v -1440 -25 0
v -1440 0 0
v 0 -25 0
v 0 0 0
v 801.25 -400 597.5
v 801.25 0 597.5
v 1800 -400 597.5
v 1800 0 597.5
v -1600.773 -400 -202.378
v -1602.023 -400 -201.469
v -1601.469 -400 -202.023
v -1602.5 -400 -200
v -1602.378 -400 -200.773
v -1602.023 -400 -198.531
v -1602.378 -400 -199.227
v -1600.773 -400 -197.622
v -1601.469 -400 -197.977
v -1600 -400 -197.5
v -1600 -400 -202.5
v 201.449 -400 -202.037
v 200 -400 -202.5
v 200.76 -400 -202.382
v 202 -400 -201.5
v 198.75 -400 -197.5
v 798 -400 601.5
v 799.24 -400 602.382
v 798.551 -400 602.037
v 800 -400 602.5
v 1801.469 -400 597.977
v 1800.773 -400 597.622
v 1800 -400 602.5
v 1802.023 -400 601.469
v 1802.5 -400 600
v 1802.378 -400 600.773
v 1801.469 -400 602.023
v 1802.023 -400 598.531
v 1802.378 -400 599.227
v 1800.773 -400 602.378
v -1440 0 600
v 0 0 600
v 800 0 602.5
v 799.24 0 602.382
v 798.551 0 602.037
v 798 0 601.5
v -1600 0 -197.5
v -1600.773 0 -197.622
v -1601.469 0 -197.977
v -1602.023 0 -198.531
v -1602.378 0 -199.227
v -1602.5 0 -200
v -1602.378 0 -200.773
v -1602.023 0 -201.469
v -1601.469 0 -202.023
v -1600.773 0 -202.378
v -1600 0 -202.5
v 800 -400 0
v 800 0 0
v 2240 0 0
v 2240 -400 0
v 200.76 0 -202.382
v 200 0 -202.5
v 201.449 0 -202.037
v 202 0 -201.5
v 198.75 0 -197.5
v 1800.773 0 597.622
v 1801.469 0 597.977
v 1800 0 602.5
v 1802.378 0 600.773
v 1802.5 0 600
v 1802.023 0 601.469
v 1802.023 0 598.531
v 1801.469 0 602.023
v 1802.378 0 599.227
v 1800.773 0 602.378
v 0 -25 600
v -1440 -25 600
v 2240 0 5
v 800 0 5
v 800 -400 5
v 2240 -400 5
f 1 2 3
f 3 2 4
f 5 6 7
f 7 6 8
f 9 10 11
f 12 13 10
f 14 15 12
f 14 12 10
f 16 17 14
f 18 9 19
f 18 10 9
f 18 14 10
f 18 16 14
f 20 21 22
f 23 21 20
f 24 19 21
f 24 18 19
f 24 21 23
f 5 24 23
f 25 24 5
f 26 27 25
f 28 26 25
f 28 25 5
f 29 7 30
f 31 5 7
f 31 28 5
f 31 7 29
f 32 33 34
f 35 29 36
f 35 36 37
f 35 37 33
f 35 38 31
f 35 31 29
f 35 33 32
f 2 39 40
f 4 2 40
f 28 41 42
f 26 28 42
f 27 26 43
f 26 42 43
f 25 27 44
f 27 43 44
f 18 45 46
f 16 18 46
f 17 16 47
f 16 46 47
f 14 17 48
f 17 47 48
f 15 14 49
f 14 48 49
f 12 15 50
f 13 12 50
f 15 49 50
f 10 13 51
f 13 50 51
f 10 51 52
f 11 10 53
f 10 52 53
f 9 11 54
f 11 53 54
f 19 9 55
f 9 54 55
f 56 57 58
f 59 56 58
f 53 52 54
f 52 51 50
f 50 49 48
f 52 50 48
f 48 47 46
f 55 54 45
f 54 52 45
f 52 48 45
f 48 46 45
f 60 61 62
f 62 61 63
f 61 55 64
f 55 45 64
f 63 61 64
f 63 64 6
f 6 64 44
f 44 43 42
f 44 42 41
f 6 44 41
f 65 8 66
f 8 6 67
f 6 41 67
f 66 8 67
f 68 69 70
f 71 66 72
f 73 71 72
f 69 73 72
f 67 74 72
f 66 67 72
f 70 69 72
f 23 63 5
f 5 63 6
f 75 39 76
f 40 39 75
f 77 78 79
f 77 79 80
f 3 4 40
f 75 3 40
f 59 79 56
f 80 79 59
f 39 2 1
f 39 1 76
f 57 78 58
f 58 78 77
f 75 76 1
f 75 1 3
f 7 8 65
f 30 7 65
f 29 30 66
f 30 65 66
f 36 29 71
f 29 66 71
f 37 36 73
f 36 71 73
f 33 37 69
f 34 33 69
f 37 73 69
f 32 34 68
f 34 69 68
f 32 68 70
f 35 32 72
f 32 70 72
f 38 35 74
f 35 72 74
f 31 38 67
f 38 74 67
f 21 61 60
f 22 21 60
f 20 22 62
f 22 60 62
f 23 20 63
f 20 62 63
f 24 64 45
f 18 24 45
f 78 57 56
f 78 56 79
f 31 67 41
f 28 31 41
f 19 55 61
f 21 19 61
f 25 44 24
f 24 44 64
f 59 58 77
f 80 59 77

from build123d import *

# Parameters (mm, degrees)
F0_W     = 1440
F0_H     = 600
F1_DEPTH = 25
F3_DEPTH = 400
F2_W     = 1440
F2_H     = 5


with BuildPart() as f1:
    # F0 (on Front) → F1 (new body)
    with BuildSketch(Plane.XZ):
        with Locations((-720, 300)):
            Rectangle(F0_W, F0_H)
    extrude(amount=F1_DEPTH)


with BuildPart() as f3:
    # F2 (on Front) → F3 (new body)
    with BuildSketch(Plane.XZ):
        with BuildLine():
            ThreePointArc((198, -198.5), (197.6282917549, -199.209430585), (197.5, -200))
            Line((197.5, -200), (200, -200))
            Line((200, -200), (201.5, -198))
            ThreePointArc((201.5, -198), (200.790569415, -197.6282917549), (200, -197.5))
            Line((200, -197.5), (198.75, -197.5))
            Line((198.75, -197.5), (198, -198.5))
        make_face()
        with BuildLine():
            Line((200, -200), (197.5, -200))
            ThreePointArc((197.5, -200), (198.232233047, -201.767766953), (200, -202.5))
            ThreePointArc((200, -202.5), (201.1180339887, -202.2360679775), (202, -201.5))
            ThreePointArc((202, -201.5), (202.4748737342, -199.6464466094), (201.5, -198))
            Line((201.5, -198), (200, -200))
        make_face()
        with BuildLine():
            ThreePointArc((200, -202.5), (198.232233047, -201.767766953), (197.5, -200))
            ThreePointArc((197.5, -200), (197.6282917549, -199.209430585), (198, -198.5))
            Line((198, -198.5), (198.75, -197.5))
            Line((198.75, -197.5), (-1600, -197.5))
            ThreePointArc((-1600, -197.5), (-1602.5, -200), (-1600, -202.5))
            Line((-1600, -202.5), (200, -202.5))
        make_face()
        with BuildLine():
            ThreePointArc((200, -197.5), (200.790569415, -197.6282917549), (201.5, -198))
            Line((201.5, -198), (798.5, 598))
            ThreePointArc((798.5, 598), (797.5251262658, 599.6464466094), (798, 601.5))
            Line((798, 601.5), (198.75, -197.5))
            Line((198.75, -197.5), (200, -197.5))
        make_face()
        with BuildLine():
            Line((798.5, 598), (201.5, -198))
            ThreePointArc((201.5, -198), (202.4748737342, -199.6464466094), (202, -201.5))
            Line((202, -201.5), (801.25, 597.5))
            Line((801.25, 597.5), (800, 597.5))
            ThreePointArc((800, 597.5), (799.209430585, 597.6282917549), (798.5, 598))
        make_face()
        with BuildLine():
            ThreePointArc((798, 601.5), (797.5251262658, 599.6464466094), (798.5, 598))
            Line((798.5, 598), (800, 600))
            Line((800, 600), (802.5, 600))
            ThreePointArc((802.5, 600), (801.767766953, 601.767766953), (800, 602.5))
            ThreePointArc((800, 602.5), (798.8819660113, 602.2360679775), (798, 601.5))
        make_face()
        with BuildLine():
            Line((800, 600), (798.5, 598))
            ThreePointArc((798.5, 598), (799.209430585, 597.6282917549), (800, 597.5))
            Line((800, 597.5), (801.25, 597.5))
            Line((801.25, 597.5), (802, 598.5))
            ThreePointArc((802, 598.5), (802.3717082451, 599.209430585), (802.5, 600))
            Line((802.5, 600), (800, 600))
        make_face()
        with BuildLine():
            Line((802, 598.5), (801.25, 597.5))
            Line((801.25, 597.5), (1800, 597.5))
            ThreePointArc((1800, 597.5), (1802.5, 600), (1800, 602.5))
            Line((1800, 602.5), (800, 602.5))
            ThreePointArc((800, 602.5), (801.767766953, 601.767766953), (802.5, 600))
            ThreePointArc((802.5, 600), (802.3717082451, 599.209430585), (802, 598.5))
        make_face()
    extrude(amount=F3_DEPTH)


with BuildPart() as f3b:
    # F2 (on Front) → F3, piece 2 (new body)
    with BuildSketch(Plane.XZ):
        with Locations((1520, 2.5)):
            Rectangle(F2_W, F2_H)
    extrude(amount=F3_DEPTH)


solid = Compound([f1.part, f3.part, f3b.part])
